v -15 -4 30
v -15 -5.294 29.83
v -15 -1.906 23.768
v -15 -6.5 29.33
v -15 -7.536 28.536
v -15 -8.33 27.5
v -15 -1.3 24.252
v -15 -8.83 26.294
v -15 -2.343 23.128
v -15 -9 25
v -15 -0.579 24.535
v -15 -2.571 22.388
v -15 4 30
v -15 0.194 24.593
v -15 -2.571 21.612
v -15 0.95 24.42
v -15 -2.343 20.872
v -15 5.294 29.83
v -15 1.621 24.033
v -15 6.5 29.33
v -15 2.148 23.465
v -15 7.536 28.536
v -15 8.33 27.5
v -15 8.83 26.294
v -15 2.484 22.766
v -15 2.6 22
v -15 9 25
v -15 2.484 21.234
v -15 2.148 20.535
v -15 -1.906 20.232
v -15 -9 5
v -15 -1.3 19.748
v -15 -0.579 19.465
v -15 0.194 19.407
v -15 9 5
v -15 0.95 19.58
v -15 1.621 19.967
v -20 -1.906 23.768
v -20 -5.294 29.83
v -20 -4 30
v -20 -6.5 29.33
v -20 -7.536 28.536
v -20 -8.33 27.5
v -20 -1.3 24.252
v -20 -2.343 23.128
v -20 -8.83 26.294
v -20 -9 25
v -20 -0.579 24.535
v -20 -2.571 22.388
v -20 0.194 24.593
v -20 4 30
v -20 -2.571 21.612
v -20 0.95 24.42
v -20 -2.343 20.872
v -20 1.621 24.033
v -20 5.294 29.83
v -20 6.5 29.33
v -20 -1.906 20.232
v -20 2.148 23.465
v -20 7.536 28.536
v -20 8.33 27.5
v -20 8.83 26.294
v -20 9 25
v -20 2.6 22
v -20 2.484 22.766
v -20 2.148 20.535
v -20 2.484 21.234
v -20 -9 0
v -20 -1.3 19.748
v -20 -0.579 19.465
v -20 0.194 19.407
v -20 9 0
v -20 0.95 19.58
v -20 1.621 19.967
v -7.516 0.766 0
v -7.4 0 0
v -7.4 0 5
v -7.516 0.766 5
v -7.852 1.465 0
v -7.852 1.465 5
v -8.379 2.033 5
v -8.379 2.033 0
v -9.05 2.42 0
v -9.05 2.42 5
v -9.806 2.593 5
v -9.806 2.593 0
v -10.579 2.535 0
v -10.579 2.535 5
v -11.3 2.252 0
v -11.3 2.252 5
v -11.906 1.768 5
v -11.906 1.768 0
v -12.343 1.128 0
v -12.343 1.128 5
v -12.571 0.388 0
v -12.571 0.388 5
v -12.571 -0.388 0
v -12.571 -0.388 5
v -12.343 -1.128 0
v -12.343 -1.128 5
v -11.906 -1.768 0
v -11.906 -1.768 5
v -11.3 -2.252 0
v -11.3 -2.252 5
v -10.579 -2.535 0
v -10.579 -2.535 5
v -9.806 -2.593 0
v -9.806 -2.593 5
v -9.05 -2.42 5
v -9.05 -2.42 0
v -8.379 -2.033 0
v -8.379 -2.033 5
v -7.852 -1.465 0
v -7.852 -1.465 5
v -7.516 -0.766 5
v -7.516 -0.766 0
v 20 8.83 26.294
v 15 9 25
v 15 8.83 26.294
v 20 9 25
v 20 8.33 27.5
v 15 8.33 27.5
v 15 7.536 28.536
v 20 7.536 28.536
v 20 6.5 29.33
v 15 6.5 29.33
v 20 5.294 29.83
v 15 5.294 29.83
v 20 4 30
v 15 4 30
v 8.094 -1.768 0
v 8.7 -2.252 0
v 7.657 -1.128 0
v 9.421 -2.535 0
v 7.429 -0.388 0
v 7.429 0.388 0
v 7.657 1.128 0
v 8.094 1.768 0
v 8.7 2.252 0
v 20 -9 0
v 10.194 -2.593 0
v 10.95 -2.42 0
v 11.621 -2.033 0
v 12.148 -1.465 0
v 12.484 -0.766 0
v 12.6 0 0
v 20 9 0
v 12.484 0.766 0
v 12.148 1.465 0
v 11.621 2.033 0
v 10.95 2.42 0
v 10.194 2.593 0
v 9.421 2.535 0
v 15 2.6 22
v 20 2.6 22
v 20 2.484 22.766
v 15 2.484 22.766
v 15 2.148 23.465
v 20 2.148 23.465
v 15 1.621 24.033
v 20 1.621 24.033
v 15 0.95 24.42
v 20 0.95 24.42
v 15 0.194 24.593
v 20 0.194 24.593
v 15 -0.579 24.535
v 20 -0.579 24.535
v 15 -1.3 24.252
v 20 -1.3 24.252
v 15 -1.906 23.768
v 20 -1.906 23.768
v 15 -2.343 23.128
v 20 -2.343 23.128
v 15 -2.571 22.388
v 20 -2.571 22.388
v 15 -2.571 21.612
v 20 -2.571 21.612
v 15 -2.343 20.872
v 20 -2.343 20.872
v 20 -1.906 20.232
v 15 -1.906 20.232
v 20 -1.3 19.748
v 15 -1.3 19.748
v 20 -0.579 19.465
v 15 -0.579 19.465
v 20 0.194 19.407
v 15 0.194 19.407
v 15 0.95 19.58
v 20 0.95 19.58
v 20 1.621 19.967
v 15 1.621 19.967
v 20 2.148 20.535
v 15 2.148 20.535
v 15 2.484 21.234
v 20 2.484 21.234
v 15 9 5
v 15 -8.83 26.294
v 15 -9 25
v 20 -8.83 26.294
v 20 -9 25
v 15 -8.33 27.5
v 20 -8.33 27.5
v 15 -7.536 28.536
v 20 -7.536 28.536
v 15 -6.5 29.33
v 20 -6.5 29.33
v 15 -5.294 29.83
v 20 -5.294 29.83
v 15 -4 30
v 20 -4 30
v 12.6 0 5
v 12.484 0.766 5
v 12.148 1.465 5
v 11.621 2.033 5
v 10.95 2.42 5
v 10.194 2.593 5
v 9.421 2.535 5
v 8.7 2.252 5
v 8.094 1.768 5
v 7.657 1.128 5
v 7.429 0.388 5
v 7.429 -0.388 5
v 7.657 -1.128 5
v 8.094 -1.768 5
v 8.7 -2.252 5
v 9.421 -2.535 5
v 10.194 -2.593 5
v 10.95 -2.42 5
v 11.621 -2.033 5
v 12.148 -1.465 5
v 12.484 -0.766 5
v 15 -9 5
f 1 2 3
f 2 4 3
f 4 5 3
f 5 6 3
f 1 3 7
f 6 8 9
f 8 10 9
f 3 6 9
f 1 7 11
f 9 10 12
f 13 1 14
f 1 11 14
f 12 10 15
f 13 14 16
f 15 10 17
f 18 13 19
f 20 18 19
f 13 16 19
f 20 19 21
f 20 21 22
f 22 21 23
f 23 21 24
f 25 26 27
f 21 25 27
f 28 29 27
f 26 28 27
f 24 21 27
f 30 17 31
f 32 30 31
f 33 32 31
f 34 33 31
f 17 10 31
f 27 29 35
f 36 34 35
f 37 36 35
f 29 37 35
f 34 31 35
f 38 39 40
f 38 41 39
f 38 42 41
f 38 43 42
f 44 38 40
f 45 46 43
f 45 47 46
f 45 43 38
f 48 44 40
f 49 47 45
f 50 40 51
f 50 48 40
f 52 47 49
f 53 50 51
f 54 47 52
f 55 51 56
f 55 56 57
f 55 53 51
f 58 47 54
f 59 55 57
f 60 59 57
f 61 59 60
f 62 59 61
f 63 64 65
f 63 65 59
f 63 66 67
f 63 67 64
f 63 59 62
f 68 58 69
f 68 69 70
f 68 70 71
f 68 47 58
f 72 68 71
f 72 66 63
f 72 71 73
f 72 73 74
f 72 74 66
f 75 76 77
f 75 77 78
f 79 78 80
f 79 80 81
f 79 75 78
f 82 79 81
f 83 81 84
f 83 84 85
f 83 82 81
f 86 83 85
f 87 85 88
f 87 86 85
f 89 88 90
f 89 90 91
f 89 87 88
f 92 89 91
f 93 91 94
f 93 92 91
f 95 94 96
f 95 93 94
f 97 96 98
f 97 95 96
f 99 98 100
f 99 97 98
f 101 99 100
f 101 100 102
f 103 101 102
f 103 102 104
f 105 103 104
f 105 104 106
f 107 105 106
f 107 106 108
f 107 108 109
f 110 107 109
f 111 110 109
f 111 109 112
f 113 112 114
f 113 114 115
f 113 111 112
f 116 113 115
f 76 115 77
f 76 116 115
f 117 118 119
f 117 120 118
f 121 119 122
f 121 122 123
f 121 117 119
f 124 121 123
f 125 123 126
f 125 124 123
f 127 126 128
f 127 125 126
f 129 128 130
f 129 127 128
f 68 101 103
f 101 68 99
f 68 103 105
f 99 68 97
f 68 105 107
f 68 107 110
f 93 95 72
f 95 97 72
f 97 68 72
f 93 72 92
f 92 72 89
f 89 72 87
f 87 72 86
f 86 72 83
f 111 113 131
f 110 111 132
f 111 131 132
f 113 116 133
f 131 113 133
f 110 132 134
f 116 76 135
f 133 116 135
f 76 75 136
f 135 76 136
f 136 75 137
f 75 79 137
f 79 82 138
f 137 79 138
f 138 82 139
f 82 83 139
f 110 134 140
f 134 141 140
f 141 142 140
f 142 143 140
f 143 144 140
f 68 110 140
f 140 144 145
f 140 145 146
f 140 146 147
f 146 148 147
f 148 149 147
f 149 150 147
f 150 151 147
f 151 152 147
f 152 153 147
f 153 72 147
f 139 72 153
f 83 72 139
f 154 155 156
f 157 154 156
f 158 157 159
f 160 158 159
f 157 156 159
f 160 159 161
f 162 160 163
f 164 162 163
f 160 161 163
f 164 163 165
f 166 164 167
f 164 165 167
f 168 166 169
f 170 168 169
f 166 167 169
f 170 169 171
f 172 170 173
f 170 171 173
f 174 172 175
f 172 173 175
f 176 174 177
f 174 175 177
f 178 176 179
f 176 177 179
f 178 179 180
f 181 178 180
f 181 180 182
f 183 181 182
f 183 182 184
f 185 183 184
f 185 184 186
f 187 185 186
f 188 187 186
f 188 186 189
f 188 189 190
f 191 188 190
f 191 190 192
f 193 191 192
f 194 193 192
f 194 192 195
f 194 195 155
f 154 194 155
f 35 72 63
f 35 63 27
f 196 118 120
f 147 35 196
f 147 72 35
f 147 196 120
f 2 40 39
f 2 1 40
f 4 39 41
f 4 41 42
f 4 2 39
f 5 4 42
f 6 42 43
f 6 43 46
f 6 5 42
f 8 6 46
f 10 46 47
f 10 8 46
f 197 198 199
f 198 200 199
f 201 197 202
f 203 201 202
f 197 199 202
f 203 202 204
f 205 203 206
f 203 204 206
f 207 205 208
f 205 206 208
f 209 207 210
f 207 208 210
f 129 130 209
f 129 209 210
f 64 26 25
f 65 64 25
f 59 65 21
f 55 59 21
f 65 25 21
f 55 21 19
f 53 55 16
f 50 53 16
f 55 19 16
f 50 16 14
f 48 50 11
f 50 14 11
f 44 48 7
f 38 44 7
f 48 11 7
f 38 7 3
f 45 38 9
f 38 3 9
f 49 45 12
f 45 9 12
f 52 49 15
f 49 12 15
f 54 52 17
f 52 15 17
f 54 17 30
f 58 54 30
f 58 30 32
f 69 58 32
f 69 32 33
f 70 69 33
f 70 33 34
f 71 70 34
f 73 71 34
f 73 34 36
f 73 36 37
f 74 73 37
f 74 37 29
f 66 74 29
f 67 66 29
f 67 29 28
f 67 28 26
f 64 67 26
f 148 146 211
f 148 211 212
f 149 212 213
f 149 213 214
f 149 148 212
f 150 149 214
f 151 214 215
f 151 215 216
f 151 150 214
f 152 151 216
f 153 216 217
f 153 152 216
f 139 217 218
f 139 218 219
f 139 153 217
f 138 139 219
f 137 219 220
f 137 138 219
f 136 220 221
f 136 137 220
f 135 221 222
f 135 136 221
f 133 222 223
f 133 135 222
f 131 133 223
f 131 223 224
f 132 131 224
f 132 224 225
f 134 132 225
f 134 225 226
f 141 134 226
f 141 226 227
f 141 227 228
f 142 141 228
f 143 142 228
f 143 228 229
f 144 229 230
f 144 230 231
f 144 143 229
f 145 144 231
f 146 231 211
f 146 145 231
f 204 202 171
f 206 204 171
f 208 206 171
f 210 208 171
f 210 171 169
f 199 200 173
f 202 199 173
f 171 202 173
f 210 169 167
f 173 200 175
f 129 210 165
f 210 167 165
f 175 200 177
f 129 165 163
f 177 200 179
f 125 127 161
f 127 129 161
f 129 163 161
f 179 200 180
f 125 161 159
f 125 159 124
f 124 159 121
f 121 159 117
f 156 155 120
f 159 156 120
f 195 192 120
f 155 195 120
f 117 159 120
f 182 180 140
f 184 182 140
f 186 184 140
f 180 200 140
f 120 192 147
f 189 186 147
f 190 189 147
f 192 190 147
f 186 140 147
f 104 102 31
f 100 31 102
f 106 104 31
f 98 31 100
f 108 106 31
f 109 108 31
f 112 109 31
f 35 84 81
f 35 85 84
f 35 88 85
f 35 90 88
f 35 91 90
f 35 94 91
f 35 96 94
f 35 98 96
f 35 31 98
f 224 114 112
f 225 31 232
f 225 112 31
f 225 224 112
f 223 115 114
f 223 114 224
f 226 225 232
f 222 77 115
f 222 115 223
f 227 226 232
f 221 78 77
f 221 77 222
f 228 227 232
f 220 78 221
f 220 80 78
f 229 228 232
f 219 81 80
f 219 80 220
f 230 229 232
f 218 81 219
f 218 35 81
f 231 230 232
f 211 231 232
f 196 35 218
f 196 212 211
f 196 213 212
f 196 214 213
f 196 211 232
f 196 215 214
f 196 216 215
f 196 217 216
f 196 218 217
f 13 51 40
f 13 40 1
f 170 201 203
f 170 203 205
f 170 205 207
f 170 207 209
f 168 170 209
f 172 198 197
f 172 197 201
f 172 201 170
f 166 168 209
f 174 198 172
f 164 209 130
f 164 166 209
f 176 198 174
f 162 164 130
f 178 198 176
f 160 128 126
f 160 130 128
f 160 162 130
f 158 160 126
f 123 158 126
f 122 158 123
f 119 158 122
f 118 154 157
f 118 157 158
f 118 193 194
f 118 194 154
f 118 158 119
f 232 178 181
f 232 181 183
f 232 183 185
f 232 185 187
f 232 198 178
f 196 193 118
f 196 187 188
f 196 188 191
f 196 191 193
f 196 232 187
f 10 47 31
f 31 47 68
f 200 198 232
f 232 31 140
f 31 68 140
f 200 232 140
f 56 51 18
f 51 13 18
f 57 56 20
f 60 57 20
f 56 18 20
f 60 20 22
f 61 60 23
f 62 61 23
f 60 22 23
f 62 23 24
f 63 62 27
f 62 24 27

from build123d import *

# Parameters (mm, degrees)
SKETCH_W     = 40
SKETCH_H     = 18
SKETCH_R     = 2.6
PAD_DEPTH    = 5
SKETCH001_W  = 5
SKETCH001_H  = 18
PAD001_DEPTH = 25
SKETCH002_R  = 2.6
POCKET_DEPTH = 40.001
FILLET_R     = 5


with BuildPart() as part:
    # Sketch → Pad (new body)
    with BuildSketch(Plane.XY):
        Rectangle(SKETCH_W, SKETCH_H)
        with Locations((10, 0)):
            Circle(SKETCH_R, mode=Mode.SUBTRACT)
        with Locations((-10, 0)):
            Circle(SKETCH_R, mode=Mode.SUBTRACT)
    extrude(amount=PAD_DEPTH)

    # Sketch001 (on Face8 of Pad) → Pad001 (join)
    with BuildSketch(Plane.XY.offset(5)):
        with Locations((-17.5, 0)):
            Rectangle(SKETCH001_W, SKETCH001_H)
        with Locations((17.5, 0)):
            Rectangle(SKETCH001_W, SKETCH001_H)
    extrude(amount=PAD001_DEPTH)

    # Sketch002 (on Face15 of Pad001) → Pocket (cut, through all)
    with BuildSketch(Plane.YZ.offset(20)):
        with Locations((0, 22)):
            Circle(SKETCH002_R)
    extrude(amount=-POCKET_DEPTH, mode=Mode.SUBTRACT)

    # Fillet
    fillet_edges = [part.edges().sort_by_distance(p)[0] for p in [
        (17.5, -9, 30),
        (17.5, 9, 30),
        (-17.5, 9, 30),
        (-17.5, -9, 30),
    ]]
    fillet(fillet_edges, radius=FILLET_R)


solid = part.part
